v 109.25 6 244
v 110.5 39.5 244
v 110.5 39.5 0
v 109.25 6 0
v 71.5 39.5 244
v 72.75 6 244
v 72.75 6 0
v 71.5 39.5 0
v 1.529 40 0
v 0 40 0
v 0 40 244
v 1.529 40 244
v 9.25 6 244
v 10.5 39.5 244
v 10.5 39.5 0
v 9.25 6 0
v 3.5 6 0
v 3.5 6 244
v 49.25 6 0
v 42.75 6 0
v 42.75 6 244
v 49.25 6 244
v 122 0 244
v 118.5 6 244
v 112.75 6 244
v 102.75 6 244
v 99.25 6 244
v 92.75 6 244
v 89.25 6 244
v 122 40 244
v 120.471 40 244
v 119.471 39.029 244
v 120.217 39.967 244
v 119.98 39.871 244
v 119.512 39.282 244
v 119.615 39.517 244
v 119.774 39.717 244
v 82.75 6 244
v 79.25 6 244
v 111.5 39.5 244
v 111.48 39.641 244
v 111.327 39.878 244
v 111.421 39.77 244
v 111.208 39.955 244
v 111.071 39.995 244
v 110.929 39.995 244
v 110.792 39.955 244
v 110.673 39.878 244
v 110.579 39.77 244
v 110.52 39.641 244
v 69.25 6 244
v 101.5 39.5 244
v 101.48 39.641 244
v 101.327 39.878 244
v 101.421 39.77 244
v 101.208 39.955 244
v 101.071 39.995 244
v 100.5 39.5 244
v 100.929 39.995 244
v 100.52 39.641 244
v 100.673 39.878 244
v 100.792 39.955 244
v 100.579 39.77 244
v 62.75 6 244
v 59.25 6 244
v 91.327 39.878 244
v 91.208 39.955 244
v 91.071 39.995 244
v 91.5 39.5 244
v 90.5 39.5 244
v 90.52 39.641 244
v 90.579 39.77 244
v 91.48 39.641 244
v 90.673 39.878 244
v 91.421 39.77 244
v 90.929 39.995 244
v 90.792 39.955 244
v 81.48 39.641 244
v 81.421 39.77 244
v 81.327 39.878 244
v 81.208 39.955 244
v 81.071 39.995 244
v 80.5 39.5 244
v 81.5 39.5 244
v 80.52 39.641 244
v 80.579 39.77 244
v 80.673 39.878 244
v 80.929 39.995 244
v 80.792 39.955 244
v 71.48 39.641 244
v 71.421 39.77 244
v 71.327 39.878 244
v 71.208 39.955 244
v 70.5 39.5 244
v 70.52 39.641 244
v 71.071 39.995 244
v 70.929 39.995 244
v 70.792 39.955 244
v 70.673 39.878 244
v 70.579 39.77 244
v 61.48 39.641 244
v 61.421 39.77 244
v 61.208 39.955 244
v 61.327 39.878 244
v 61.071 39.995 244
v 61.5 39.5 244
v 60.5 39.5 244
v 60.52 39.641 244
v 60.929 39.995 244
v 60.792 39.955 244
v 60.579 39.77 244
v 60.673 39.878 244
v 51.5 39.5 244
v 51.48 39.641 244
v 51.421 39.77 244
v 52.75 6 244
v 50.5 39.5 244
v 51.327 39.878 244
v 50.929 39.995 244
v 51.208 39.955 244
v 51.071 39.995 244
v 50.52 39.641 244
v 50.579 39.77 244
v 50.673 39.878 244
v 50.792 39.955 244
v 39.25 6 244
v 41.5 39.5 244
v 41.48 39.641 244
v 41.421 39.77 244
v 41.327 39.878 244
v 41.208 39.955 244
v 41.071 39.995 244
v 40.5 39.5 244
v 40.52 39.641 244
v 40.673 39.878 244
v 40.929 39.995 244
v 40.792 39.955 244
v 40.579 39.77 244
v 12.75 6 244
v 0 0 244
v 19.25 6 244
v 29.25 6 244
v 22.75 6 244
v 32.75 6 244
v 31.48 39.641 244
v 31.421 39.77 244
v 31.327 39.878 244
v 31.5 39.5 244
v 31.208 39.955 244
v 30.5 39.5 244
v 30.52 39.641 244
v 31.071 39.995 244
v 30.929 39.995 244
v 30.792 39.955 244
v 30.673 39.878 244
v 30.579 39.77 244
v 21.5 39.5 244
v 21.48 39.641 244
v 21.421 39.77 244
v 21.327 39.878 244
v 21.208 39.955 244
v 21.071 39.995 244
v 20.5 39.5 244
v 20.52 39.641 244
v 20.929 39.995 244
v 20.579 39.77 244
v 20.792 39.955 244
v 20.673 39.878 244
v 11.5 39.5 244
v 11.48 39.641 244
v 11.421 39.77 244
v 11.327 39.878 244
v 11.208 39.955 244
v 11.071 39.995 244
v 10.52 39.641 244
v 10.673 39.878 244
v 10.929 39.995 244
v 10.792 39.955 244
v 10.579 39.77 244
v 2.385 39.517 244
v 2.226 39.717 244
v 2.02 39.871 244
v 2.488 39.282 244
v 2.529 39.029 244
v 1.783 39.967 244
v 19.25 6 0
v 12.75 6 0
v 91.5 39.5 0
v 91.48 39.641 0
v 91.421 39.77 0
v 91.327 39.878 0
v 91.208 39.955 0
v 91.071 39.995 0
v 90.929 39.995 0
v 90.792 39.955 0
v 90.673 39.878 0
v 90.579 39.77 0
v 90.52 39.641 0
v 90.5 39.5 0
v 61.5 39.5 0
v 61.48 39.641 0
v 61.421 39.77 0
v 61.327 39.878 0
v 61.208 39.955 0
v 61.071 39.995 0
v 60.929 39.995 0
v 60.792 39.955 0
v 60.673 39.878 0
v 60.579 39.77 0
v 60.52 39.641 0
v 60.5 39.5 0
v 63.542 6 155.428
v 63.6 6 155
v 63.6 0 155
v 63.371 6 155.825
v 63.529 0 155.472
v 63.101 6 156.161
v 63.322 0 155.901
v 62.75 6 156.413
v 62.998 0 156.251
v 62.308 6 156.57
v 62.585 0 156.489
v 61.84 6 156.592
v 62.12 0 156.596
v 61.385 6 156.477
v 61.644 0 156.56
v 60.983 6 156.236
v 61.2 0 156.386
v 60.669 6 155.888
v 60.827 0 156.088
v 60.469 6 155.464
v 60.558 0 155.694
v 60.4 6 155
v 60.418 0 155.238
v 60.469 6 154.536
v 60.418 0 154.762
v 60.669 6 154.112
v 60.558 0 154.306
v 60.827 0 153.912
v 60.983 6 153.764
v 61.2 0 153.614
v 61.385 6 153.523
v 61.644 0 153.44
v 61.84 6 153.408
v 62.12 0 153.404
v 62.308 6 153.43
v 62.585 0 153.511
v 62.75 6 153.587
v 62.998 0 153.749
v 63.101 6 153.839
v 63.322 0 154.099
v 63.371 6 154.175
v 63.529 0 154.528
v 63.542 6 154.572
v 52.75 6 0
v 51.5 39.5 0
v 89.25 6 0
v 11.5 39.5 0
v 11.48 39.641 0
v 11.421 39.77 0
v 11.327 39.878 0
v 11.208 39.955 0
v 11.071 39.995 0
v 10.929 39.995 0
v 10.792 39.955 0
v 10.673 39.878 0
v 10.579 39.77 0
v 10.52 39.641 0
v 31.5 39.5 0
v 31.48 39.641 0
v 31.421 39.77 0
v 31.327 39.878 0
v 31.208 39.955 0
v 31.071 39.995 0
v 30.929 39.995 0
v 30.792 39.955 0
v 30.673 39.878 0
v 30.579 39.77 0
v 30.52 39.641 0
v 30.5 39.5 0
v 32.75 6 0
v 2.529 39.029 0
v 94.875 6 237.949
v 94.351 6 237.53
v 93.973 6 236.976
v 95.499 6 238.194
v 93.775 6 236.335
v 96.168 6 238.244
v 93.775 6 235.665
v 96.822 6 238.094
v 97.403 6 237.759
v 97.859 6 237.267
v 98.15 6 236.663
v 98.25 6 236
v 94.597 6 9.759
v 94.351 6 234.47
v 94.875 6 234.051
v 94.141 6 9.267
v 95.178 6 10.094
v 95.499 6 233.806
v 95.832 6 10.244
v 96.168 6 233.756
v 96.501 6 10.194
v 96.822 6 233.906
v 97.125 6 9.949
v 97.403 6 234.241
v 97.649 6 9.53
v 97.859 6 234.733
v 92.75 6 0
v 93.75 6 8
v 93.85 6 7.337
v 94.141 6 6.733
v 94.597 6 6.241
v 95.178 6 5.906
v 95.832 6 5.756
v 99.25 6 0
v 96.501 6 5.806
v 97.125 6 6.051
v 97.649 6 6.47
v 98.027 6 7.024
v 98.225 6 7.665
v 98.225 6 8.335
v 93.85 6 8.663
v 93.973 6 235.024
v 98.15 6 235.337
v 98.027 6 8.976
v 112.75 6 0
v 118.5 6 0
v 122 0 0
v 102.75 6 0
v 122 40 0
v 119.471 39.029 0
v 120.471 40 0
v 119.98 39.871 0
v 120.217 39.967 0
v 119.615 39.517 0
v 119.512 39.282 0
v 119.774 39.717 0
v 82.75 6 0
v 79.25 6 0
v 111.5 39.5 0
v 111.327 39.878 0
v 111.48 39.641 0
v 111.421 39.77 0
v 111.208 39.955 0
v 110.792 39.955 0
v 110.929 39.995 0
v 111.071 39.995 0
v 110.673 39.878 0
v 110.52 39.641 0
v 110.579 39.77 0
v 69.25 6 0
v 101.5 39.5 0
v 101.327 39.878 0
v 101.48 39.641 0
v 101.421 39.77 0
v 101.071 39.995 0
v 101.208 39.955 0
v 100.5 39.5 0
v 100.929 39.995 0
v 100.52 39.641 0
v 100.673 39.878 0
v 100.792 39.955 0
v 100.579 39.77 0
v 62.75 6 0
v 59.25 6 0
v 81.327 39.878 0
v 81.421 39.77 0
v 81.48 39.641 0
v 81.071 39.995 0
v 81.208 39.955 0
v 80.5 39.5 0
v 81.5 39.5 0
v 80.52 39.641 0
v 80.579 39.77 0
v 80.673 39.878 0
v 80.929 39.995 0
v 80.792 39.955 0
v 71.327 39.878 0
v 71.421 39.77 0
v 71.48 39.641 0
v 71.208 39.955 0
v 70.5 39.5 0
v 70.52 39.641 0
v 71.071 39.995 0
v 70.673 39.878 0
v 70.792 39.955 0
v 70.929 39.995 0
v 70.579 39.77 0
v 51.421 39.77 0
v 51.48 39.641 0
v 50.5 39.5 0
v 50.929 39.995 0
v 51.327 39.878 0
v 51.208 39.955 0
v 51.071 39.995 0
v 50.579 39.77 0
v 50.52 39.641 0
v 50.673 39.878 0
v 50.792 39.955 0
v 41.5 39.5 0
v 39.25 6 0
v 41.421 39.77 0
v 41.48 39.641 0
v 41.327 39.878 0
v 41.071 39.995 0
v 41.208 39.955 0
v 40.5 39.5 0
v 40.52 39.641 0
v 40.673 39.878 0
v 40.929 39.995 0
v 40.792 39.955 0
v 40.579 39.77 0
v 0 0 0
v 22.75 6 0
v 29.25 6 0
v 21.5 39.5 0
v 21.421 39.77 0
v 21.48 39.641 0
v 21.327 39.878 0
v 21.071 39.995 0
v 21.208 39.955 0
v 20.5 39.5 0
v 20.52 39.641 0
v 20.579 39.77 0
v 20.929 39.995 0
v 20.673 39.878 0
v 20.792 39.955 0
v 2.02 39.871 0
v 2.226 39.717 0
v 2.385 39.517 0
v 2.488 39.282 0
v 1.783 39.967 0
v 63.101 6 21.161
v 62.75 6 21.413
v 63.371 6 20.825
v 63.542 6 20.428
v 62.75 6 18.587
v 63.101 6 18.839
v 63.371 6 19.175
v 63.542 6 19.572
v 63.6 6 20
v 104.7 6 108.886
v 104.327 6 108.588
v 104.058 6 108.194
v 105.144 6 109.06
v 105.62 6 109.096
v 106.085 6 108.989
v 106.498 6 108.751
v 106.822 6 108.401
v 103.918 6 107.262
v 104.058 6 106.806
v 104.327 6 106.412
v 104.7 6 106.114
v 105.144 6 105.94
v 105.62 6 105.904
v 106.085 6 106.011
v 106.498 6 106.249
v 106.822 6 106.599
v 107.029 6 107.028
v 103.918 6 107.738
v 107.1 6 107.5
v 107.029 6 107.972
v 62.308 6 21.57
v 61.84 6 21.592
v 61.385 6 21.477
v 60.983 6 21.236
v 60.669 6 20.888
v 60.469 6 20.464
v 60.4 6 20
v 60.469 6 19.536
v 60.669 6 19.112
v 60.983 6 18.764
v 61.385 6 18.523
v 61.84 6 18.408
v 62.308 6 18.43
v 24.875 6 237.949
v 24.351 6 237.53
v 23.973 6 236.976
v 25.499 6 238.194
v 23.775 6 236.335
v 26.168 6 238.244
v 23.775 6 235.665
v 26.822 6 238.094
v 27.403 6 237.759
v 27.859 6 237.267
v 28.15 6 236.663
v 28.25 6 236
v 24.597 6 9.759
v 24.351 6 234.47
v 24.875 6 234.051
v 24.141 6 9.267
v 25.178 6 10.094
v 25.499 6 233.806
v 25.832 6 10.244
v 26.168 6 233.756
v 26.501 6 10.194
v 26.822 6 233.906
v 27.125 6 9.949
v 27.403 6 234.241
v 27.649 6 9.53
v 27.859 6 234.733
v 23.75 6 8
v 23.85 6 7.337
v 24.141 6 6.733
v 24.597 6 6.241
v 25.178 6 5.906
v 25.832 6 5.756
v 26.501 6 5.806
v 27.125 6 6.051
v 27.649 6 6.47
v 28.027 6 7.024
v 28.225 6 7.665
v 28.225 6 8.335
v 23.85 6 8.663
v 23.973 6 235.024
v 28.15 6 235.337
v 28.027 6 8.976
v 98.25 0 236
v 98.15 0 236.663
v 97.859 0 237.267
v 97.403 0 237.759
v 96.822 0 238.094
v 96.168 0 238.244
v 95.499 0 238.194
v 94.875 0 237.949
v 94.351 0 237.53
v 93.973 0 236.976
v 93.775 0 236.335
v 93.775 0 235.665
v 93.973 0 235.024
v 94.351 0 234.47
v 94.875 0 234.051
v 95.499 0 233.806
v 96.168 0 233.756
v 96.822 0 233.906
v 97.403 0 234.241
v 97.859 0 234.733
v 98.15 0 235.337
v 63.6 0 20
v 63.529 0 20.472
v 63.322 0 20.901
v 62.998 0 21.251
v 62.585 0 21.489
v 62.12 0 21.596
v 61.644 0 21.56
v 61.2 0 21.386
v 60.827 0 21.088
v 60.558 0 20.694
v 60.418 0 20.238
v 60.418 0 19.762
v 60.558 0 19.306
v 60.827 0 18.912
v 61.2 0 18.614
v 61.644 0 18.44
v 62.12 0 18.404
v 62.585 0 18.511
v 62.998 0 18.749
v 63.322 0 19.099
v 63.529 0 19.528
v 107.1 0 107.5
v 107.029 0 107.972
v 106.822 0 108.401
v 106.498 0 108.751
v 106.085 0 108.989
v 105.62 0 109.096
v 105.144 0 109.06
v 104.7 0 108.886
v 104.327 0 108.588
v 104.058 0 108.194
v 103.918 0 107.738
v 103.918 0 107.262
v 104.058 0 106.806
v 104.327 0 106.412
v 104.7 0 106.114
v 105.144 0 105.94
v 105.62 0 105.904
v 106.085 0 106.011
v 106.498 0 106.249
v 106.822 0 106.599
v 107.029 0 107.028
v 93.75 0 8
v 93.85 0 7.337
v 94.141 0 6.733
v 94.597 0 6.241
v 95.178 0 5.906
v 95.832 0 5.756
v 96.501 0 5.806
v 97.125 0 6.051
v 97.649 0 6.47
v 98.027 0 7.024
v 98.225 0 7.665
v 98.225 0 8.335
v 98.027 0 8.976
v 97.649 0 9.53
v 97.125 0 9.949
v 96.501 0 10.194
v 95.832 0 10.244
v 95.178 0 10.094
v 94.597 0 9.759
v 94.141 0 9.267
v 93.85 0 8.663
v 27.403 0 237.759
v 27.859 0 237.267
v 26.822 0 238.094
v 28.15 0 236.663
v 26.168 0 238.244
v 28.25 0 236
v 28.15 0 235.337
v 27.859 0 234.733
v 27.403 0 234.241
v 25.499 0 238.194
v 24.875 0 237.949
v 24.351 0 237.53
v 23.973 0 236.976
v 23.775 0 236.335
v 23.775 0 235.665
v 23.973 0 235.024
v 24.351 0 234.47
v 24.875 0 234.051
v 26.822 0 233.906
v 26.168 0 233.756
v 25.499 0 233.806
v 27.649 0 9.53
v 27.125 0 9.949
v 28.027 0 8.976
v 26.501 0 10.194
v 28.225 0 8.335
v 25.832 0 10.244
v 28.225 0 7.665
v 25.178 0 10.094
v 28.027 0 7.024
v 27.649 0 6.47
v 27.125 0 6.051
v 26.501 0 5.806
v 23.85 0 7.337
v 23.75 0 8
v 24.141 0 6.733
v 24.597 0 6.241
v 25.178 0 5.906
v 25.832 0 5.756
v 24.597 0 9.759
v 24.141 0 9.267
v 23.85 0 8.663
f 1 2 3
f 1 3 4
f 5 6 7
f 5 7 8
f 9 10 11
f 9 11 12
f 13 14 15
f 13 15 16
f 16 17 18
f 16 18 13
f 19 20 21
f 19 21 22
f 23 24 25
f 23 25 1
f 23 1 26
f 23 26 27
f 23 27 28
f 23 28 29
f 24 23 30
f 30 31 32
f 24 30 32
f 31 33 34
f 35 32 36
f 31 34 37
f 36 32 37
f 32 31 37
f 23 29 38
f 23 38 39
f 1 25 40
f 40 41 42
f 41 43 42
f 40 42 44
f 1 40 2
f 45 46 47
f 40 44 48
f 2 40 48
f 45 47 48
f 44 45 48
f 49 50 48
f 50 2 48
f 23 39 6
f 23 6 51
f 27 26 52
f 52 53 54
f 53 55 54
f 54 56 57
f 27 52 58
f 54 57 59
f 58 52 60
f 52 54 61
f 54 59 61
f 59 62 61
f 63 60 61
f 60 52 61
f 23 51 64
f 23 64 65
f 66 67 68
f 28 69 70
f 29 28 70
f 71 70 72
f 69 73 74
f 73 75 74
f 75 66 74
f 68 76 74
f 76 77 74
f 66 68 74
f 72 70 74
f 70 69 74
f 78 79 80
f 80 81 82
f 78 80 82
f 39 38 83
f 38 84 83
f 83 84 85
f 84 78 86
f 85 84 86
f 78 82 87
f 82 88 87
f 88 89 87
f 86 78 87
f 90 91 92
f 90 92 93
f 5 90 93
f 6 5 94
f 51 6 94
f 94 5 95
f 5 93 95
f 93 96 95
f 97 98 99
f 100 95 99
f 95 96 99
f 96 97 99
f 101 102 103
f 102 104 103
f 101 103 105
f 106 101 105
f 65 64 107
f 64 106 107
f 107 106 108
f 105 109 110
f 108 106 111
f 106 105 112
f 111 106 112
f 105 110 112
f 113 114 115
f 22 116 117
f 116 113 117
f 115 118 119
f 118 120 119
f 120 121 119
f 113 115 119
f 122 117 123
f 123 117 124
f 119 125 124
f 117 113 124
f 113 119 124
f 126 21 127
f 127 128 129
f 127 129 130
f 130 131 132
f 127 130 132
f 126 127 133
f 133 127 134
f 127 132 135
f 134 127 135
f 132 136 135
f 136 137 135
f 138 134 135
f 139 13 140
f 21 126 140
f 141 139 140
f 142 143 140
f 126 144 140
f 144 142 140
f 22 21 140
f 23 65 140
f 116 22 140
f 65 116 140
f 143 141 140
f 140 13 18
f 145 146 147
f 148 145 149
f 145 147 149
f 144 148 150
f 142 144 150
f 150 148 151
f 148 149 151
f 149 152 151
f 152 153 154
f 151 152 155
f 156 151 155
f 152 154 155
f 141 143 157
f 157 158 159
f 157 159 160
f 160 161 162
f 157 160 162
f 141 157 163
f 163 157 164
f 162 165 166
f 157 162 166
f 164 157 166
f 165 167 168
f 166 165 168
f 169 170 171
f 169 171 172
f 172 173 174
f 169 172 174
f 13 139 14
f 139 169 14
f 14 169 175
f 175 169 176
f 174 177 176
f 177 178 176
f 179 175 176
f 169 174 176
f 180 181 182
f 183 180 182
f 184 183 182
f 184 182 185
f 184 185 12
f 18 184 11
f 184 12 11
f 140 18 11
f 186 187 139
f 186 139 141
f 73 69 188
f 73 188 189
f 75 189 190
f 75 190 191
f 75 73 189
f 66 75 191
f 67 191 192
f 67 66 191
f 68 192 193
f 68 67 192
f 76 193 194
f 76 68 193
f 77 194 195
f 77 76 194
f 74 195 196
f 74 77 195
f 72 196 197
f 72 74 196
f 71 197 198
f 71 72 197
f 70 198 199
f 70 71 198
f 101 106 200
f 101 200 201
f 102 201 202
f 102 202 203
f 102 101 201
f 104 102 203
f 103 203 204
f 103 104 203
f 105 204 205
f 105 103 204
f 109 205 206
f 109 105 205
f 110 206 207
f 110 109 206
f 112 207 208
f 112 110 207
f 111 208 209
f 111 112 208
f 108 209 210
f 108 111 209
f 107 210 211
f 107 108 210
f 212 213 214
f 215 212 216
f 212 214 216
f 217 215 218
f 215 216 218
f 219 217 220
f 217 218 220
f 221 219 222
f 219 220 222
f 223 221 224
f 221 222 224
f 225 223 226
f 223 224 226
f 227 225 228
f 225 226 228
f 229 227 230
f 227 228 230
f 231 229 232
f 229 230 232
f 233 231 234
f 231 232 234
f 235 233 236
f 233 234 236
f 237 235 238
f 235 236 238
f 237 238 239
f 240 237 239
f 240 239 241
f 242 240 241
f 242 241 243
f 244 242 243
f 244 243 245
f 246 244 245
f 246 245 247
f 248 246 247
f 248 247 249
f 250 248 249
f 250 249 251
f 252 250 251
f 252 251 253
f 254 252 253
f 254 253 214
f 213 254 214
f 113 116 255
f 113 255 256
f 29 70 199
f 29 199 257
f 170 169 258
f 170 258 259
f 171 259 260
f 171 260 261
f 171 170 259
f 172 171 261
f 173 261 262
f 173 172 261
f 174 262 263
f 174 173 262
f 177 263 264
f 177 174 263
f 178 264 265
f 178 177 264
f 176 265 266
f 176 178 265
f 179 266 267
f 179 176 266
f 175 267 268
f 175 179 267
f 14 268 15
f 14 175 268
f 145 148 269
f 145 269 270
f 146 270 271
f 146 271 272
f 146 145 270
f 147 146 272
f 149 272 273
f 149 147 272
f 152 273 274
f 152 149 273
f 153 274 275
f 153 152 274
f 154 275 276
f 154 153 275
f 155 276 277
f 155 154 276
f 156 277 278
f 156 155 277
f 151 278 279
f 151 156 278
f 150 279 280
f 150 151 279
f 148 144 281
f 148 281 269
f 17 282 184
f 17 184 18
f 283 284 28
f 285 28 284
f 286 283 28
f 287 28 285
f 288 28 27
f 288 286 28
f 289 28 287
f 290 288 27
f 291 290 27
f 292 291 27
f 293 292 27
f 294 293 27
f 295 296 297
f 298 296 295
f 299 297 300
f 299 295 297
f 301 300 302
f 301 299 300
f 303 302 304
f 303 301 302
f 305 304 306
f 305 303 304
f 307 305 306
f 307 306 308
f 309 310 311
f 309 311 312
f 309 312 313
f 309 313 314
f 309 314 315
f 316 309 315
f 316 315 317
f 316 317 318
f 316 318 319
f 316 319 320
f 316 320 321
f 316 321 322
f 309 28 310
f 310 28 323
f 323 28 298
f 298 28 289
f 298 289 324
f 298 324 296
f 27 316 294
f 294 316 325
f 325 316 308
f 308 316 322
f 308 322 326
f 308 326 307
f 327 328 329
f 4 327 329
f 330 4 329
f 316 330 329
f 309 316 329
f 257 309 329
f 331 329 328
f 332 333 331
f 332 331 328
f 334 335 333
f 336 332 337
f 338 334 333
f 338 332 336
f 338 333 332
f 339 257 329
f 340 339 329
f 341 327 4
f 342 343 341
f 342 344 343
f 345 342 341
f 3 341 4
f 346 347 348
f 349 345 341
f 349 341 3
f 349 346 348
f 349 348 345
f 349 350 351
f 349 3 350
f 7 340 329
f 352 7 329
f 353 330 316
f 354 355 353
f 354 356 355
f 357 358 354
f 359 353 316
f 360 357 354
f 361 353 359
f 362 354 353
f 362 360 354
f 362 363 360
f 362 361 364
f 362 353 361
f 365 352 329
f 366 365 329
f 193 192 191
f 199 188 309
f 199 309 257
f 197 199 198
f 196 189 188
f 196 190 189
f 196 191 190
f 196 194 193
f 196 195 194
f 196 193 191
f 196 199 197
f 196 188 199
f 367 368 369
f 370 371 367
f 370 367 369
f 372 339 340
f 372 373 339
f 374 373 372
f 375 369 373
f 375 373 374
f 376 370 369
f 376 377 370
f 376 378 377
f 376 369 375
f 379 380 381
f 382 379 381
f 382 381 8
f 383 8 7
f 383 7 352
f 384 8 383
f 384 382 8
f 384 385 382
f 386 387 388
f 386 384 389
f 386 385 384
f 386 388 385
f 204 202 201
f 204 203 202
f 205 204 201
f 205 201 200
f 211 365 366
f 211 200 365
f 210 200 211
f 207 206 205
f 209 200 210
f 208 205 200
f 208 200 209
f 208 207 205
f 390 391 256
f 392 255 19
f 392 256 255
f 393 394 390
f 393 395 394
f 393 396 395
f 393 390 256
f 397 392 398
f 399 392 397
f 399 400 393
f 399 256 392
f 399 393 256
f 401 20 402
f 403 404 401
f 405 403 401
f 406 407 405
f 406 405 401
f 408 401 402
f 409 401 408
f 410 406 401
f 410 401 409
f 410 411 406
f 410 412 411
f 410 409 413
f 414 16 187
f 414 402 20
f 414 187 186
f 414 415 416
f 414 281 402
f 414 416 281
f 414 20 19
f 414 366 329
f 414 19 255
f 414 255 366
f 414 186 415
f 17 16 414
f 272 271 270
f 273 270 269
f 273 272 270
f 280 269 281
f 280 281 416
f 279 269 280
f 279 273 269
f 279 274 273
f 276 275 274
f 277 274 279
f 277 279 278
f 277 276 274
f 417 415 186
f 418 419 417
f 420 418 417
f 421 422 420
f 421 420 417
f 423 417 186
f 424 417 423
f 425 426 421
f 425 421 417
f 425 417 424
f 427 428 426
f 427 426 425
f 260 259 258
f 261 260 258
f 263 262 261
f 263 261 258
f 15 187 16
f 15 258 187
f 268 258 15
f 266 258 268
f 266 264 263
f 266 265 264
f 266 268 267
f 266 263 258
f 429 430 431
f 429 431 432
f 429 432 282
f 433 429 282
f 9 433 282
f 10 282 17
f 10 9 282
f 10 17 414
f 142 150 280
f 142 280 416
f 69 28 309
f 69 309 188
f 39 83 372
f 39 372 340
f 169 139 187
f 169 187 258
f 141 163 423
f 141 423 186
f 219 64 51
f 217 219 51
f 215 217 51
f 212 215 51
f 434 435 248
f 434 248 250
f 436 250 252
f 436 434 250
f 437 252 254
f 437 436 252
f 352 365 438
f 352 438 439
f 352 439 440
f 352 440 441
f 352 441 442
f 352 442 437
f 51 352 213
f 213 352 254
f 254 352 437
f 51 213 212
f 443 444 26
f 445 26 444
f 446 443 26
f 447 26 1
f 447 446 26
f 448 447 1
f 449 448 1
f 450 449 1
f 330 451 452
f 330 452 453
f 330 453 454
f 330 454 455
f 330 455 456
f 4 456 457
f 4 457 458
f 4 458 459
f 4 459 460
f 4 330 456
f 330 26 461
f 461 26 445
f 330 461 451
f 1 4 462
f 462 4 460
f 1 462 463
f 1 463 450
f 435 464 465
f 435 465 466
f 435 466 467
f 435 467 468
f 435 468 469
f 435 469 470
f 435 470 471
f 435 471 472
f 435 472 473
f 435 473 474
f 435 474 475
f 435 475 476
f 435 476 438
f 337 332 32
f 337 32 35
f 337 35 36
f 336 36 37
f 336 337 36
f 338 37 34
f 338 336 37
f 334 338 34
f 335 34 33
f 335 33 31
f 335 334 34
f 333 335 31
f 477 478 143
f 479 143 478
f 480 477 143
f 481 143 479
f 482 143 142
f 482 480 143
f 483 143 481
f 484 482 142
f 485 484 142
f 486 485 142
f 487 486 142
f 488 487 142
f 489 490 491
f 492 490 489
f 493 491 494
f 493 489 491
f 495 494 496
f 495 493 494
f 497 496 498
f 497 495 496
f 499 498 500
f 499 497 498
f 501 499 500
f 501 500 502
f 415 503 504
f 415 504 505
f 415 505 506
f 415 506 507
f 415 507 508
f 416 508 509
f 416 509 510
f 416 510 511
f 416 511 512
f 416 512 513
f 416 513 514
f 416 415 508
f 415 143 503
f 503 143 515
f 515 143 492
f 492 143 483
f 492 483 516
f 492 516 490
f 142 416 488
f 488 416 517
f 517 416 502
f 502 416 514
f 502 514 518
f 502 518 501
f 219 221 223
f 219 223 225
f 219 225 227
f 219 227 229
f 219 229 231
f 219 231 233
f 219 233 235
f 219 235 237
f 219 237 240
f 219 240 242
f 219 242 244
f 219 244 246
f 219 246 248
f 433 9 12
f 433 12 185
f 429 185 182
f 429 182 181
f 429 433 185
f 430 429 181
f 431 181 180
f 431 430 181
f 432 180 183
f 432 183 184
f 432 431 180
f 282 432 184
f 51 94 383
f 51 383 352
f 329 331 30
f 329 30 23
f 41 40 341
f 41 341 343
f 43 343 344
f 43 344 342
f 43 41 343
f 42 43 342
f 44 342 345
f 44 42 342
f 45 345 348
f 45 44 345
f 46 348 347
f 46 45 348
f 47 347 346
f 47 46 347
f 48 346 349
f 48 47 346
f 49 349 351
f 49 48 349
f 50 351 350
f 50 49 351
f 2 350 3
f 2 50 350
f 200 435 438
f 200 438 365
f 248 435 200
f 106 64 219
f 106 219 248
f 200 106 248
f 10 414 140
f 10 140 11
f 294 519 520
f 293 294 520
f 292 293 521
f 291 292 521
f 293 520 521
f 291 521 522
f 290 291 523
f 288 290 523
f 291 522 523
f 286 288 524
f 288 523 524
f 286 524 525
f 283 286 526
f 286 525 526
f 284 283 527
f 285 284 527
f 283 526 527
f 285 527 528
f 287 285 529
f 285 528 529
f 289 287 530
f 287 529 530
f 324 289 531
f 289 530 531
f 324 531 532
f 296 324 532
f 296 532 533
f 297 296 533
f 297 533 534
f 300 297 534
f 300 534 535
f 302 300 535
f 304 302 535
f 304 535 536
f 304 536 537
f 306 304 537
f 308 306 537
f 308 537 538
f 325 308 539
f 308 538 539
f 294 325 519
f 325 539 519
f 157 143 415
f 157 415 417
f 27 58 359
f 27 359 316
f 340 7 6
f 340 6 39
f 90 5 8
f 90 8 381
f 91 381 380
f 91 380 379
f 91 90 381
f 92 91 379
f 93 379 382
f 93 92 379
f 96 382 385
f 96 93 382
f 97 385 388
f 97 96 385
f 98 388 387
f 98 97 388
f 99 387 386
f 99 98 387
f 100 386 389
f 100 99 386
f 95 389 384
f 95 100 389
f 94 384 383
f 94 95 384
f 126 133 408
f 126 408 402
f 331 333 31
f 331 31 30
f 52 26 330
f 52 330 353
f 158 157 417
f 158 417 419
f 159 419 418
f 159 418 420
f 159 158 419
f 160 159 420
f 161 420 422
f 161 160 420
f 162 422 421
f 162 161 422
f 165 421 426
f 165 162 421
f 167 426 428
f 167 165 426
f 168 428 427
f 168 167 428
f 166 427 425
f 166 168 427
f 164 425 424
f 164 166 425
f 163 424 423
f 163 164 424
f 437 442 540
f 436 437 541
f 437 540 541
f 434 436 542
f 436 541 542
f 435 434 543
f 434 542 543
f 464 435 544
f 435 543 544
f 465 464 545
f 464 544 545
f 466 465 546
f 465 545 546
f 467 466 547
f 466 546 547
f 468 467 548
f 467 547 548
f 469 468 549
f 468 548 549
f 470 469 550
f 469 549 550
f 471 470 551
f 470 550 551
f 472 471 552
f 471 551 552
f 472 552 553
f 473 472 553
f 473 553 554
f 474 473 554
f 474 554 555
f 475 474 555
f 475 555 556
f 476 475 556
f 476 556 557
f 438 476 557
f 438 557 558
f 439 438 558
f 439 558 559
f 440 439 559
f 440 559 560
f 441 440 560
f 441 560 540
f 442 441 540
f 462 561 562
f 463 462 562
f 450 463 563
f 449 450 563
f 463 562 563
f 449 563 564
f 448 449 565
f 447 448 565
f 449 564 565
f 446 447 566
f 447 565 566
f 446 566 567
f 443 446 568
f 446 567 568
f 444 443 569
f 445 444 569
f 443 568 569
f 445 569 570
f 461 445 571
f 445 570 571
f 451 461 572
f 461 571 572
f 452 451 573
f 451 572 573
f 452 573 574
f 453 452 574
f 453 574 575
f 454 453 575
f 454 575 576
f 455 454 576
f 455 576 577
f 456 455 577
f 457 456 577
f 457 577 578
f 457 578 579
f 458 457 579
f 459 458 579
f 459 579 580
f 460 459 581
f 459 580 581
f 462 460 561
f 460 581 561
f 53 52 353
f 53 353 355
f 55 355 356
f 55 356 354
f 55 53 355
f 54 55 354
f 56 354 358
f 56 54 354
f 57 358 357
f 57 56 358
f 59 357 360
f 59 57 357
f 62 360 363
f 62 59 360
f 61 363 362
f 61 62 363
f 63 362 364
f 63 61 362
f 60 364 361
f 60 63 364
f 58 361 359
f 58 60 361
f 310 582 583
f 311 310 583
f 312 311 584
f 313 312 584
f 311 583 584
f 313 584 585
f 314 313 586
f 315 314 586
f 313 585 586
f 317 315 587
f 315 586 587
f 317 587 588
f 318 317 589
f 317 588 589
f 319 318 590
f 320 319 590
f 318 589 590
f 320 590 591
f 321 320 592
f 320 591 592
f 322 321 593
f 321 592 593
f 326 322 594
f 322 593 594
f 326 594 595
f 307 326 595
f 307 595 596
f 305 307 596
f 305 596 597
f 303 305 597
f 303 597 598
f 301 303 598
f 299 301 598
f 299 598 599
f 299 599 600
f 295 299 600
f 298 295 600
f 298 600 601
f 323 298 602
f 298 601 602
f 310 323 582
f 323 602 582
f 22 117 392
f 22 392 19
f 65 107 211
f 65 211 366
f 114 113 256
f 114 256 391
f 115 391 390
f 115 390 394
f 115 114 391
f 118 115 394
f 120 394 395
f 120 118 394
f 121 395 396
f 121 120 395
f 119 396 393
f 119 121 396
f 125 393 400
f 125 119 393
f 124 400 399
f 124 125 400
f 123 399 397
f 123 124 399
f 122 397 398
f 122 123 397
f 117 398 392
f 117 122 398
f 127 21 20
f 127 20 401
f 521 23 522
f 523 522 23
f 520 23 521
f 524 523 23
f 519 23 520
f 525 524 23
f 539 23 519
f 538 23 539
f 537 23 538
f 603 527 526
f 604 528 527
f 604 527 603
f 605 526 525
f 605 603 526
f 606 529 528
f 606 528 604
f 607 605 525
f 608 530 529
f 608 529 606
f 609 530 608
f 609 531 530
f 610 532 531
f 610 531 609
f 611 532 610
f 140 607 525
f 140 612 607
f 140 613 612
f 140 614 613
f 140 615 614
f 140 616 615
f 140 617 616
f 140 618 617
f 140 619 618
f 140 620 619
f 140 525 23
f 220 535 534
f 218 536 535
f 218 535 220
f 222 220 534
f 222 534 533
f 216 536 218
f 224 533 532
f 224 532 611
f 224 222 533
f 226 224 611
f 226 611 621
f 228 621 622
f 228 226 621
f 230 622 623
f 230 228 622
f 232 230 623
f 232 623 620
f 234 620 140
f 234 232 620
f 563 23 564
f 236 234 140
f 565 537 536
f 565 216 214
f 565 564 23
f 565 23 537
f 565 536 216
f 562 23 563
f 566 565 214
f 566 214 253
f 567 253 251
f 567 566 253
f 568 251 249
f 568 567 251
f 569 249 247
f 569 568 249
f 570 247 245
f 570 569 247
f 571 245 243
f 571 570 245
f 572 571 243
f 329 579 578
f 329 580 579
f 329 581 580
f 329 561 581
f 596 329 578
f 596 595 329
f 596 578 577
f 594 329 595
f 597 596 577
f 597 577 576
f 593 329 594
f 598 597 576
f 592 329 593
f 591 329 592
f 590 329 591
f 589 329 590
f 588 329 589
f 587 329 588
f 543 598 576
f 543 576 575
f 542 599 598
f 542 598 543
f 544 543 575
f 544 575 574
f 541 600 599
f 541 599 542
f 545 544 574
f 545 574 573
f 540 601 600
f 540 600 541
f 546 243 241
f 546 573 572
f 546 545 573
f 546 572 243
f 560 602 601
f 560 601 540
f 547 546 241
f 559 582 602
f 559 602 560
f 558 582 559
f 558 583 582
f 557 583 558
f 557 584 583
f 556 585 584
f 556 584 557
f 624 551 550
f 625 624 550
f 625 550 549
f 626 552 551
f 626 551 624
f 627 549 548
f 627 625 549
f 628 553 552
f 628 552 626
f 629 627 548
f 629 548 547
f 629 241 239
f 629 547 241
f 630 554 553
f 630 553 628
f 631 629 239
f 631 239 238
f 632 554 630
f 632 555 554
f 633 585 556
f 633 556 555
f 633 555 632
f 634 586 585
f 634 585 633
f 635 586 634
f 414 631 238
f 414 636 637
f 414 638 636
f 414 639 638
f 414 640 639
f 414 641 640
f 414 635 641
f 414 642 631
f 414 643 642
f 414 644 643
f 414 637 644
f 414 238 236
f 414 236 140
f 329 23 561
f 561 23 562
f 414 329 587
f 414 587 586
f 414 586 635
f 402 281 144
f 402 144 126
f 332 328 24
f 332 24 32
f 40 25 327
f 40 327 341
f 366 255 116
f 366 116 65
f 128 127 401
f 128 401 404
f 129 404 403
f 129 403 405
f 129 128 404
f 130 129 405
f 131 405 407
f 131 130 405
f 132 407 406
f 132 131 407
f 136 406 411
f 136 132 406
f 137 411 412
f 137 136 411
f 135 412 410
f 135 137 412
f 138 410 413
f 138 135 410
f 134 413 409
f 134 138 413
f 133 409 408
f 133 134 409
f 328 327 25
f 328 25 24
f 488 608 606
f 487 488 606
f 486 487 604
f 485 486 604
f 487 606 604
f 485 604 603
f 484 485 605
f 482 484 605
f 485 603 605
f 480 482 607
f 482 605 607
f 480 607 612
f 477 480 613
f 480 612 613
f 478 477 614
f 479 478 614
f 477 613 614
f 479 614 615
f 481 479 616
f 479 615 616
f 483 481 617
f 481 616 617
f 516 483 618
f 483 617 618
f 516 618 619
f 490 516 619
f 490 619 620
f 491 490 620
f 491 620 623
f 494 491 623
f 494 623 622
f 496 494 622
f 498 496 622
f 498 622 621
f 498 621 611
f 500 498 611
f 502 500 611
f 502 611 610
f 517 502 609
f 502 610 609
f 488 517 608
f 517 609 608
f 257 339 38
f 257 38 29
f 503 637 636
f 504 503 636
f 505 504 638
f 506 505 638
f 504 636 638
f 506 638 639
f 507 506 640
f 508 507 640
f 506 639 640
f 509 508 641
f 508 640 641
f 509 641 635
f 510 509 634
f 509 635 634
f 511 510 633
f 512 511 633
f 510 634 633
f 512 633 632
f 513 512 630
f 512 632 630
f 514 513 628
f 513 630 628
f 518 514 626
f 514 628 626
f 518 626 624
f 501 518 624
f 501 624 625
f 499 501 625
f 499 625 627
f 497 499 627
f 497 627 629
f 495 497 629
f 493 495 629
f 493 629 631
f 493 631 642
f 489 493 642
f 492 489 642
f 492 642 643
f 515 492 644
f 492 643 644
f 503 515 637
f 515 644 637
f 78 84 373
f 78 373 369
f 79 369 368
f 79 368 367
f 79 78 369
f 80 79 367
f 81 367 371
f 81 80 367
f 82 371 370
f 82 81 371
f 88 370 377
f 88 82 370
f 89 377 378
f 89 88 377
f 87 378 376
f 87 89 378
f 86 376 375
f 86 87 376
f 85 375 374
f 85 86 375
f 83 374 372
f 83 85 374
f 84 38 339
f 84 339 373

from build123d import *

# Parameters (mm, degrees)
EXTRUDE_1_DEPTH       = 244
EXTRUDE_3_DEPTH       = 244
PATTERN_CURVE_1_COUNT = 11
PATTERN_CURVE_1_PITCH = 10
SKETCH_3_R            = 2.25
CUT_EXTRUDE_1_DEPTH   = 6
SKETCH_4_R            = 1.6
CUT_EXTRUDE_2_DEPTH   = 6


with BuildPart() as part:
    # Эскиз1 → Вытянуть1 (new body)
    with BuildSketch(Plane.XY):
        with BuildLine():
            Line((0, 40), (1.528979332, 40))
            ThreePointArc((1.528979332, 40), (2.225614441, 39.717425624), (2.528547087, 39.029399052))
            Line((2.528547087, 39.029399052), (3.5, 6))
            Line((3.5, 6), (118.5, 6))
            Line((118.5, 6), (119.471452913, 39.029399052))
            ThreePointArc((119.471452913, 39.029399052), (119.774385559, 39.717425624), (120.471020668, 40))
            Line((120.471020668, 40), (122, 40))
            Line((122, 40), (122, 0))
            Line((122, 0), (0, 0))
            Line((0, 0), (0, 40))
        make_face()
    extrude(amount=EXTRUDE_1_DEPTH)

    # Эскиз2 → Вытянуть3 (add)
    with BuildSketch(Plane.XY.offset(244)):
        with BuildLine():
            Line((10.5, 39.5), (9.25, 6))
            Line((9.25, 6), (12.75, 6))
            Line((12.75, 6), (11.5, 39.5))
            ThreePointArc((11.5, 39.5), (11, 40), (10.5, 39.5))
        make_face()
    extrude_3 = extrude(amount=-EXTRUDE_3_DEPTH)

    # Кривая1: Вытянуть3 ×11
    with Locations(*[(i * PATTERN_CURVE_1_PITCH, 0, 0) for i in range(1, PATTERN_CURVE_1_COUNT)]):
        add(extrude_3)

    # Эскиз3 → Вырез-Вытянуть1 (cut)
    with BuildSketch(Plane.XZ):
        with Locations((26, 236)):
            Circle(SKETCH_3_R)
        with Locations((96, 236)):
            Circle(SKETCH_3_R)
        with Locations(Location((96, 8, 0), (0, 0, 180))):
            Circle(SKETCH_3_R)
        with Locations(Location((26, 8, 0), (0, 0, 180))):
            Circle(SKETCH_3_R)
    extrude(amount=-CUT_EXTRUDE_1_DEPTH, mode=Mode.SUBTRACT)

    # Эскиз4 → Вырез-Вытянуть2 (cut)
    with BuildSketch(Plane(origin=(147.933613103, 0, 237.946321054), x_dir=(-1, 0, 0), z_dir=(0, -1, 0))):
        with Locations(Location((42.433613103, 130.446321054, 0), (0, 0, 180))):
            Circle(SKETCH_4_R)
        with Locations(Location((85.933613103, 217.946321054, 0), (0, 0, 180))):
            Circle(SKETCH_4_R)
        with Locations(Location((85.933613103, 82.946321054, 0), (0, 0, 180))):
            Circle(SKETCH_4_R)
    extrude(amount=-CUT_EXTRUDE_2_DEPTH, mode=Mode.SUBTRACT)


solid = part.part
